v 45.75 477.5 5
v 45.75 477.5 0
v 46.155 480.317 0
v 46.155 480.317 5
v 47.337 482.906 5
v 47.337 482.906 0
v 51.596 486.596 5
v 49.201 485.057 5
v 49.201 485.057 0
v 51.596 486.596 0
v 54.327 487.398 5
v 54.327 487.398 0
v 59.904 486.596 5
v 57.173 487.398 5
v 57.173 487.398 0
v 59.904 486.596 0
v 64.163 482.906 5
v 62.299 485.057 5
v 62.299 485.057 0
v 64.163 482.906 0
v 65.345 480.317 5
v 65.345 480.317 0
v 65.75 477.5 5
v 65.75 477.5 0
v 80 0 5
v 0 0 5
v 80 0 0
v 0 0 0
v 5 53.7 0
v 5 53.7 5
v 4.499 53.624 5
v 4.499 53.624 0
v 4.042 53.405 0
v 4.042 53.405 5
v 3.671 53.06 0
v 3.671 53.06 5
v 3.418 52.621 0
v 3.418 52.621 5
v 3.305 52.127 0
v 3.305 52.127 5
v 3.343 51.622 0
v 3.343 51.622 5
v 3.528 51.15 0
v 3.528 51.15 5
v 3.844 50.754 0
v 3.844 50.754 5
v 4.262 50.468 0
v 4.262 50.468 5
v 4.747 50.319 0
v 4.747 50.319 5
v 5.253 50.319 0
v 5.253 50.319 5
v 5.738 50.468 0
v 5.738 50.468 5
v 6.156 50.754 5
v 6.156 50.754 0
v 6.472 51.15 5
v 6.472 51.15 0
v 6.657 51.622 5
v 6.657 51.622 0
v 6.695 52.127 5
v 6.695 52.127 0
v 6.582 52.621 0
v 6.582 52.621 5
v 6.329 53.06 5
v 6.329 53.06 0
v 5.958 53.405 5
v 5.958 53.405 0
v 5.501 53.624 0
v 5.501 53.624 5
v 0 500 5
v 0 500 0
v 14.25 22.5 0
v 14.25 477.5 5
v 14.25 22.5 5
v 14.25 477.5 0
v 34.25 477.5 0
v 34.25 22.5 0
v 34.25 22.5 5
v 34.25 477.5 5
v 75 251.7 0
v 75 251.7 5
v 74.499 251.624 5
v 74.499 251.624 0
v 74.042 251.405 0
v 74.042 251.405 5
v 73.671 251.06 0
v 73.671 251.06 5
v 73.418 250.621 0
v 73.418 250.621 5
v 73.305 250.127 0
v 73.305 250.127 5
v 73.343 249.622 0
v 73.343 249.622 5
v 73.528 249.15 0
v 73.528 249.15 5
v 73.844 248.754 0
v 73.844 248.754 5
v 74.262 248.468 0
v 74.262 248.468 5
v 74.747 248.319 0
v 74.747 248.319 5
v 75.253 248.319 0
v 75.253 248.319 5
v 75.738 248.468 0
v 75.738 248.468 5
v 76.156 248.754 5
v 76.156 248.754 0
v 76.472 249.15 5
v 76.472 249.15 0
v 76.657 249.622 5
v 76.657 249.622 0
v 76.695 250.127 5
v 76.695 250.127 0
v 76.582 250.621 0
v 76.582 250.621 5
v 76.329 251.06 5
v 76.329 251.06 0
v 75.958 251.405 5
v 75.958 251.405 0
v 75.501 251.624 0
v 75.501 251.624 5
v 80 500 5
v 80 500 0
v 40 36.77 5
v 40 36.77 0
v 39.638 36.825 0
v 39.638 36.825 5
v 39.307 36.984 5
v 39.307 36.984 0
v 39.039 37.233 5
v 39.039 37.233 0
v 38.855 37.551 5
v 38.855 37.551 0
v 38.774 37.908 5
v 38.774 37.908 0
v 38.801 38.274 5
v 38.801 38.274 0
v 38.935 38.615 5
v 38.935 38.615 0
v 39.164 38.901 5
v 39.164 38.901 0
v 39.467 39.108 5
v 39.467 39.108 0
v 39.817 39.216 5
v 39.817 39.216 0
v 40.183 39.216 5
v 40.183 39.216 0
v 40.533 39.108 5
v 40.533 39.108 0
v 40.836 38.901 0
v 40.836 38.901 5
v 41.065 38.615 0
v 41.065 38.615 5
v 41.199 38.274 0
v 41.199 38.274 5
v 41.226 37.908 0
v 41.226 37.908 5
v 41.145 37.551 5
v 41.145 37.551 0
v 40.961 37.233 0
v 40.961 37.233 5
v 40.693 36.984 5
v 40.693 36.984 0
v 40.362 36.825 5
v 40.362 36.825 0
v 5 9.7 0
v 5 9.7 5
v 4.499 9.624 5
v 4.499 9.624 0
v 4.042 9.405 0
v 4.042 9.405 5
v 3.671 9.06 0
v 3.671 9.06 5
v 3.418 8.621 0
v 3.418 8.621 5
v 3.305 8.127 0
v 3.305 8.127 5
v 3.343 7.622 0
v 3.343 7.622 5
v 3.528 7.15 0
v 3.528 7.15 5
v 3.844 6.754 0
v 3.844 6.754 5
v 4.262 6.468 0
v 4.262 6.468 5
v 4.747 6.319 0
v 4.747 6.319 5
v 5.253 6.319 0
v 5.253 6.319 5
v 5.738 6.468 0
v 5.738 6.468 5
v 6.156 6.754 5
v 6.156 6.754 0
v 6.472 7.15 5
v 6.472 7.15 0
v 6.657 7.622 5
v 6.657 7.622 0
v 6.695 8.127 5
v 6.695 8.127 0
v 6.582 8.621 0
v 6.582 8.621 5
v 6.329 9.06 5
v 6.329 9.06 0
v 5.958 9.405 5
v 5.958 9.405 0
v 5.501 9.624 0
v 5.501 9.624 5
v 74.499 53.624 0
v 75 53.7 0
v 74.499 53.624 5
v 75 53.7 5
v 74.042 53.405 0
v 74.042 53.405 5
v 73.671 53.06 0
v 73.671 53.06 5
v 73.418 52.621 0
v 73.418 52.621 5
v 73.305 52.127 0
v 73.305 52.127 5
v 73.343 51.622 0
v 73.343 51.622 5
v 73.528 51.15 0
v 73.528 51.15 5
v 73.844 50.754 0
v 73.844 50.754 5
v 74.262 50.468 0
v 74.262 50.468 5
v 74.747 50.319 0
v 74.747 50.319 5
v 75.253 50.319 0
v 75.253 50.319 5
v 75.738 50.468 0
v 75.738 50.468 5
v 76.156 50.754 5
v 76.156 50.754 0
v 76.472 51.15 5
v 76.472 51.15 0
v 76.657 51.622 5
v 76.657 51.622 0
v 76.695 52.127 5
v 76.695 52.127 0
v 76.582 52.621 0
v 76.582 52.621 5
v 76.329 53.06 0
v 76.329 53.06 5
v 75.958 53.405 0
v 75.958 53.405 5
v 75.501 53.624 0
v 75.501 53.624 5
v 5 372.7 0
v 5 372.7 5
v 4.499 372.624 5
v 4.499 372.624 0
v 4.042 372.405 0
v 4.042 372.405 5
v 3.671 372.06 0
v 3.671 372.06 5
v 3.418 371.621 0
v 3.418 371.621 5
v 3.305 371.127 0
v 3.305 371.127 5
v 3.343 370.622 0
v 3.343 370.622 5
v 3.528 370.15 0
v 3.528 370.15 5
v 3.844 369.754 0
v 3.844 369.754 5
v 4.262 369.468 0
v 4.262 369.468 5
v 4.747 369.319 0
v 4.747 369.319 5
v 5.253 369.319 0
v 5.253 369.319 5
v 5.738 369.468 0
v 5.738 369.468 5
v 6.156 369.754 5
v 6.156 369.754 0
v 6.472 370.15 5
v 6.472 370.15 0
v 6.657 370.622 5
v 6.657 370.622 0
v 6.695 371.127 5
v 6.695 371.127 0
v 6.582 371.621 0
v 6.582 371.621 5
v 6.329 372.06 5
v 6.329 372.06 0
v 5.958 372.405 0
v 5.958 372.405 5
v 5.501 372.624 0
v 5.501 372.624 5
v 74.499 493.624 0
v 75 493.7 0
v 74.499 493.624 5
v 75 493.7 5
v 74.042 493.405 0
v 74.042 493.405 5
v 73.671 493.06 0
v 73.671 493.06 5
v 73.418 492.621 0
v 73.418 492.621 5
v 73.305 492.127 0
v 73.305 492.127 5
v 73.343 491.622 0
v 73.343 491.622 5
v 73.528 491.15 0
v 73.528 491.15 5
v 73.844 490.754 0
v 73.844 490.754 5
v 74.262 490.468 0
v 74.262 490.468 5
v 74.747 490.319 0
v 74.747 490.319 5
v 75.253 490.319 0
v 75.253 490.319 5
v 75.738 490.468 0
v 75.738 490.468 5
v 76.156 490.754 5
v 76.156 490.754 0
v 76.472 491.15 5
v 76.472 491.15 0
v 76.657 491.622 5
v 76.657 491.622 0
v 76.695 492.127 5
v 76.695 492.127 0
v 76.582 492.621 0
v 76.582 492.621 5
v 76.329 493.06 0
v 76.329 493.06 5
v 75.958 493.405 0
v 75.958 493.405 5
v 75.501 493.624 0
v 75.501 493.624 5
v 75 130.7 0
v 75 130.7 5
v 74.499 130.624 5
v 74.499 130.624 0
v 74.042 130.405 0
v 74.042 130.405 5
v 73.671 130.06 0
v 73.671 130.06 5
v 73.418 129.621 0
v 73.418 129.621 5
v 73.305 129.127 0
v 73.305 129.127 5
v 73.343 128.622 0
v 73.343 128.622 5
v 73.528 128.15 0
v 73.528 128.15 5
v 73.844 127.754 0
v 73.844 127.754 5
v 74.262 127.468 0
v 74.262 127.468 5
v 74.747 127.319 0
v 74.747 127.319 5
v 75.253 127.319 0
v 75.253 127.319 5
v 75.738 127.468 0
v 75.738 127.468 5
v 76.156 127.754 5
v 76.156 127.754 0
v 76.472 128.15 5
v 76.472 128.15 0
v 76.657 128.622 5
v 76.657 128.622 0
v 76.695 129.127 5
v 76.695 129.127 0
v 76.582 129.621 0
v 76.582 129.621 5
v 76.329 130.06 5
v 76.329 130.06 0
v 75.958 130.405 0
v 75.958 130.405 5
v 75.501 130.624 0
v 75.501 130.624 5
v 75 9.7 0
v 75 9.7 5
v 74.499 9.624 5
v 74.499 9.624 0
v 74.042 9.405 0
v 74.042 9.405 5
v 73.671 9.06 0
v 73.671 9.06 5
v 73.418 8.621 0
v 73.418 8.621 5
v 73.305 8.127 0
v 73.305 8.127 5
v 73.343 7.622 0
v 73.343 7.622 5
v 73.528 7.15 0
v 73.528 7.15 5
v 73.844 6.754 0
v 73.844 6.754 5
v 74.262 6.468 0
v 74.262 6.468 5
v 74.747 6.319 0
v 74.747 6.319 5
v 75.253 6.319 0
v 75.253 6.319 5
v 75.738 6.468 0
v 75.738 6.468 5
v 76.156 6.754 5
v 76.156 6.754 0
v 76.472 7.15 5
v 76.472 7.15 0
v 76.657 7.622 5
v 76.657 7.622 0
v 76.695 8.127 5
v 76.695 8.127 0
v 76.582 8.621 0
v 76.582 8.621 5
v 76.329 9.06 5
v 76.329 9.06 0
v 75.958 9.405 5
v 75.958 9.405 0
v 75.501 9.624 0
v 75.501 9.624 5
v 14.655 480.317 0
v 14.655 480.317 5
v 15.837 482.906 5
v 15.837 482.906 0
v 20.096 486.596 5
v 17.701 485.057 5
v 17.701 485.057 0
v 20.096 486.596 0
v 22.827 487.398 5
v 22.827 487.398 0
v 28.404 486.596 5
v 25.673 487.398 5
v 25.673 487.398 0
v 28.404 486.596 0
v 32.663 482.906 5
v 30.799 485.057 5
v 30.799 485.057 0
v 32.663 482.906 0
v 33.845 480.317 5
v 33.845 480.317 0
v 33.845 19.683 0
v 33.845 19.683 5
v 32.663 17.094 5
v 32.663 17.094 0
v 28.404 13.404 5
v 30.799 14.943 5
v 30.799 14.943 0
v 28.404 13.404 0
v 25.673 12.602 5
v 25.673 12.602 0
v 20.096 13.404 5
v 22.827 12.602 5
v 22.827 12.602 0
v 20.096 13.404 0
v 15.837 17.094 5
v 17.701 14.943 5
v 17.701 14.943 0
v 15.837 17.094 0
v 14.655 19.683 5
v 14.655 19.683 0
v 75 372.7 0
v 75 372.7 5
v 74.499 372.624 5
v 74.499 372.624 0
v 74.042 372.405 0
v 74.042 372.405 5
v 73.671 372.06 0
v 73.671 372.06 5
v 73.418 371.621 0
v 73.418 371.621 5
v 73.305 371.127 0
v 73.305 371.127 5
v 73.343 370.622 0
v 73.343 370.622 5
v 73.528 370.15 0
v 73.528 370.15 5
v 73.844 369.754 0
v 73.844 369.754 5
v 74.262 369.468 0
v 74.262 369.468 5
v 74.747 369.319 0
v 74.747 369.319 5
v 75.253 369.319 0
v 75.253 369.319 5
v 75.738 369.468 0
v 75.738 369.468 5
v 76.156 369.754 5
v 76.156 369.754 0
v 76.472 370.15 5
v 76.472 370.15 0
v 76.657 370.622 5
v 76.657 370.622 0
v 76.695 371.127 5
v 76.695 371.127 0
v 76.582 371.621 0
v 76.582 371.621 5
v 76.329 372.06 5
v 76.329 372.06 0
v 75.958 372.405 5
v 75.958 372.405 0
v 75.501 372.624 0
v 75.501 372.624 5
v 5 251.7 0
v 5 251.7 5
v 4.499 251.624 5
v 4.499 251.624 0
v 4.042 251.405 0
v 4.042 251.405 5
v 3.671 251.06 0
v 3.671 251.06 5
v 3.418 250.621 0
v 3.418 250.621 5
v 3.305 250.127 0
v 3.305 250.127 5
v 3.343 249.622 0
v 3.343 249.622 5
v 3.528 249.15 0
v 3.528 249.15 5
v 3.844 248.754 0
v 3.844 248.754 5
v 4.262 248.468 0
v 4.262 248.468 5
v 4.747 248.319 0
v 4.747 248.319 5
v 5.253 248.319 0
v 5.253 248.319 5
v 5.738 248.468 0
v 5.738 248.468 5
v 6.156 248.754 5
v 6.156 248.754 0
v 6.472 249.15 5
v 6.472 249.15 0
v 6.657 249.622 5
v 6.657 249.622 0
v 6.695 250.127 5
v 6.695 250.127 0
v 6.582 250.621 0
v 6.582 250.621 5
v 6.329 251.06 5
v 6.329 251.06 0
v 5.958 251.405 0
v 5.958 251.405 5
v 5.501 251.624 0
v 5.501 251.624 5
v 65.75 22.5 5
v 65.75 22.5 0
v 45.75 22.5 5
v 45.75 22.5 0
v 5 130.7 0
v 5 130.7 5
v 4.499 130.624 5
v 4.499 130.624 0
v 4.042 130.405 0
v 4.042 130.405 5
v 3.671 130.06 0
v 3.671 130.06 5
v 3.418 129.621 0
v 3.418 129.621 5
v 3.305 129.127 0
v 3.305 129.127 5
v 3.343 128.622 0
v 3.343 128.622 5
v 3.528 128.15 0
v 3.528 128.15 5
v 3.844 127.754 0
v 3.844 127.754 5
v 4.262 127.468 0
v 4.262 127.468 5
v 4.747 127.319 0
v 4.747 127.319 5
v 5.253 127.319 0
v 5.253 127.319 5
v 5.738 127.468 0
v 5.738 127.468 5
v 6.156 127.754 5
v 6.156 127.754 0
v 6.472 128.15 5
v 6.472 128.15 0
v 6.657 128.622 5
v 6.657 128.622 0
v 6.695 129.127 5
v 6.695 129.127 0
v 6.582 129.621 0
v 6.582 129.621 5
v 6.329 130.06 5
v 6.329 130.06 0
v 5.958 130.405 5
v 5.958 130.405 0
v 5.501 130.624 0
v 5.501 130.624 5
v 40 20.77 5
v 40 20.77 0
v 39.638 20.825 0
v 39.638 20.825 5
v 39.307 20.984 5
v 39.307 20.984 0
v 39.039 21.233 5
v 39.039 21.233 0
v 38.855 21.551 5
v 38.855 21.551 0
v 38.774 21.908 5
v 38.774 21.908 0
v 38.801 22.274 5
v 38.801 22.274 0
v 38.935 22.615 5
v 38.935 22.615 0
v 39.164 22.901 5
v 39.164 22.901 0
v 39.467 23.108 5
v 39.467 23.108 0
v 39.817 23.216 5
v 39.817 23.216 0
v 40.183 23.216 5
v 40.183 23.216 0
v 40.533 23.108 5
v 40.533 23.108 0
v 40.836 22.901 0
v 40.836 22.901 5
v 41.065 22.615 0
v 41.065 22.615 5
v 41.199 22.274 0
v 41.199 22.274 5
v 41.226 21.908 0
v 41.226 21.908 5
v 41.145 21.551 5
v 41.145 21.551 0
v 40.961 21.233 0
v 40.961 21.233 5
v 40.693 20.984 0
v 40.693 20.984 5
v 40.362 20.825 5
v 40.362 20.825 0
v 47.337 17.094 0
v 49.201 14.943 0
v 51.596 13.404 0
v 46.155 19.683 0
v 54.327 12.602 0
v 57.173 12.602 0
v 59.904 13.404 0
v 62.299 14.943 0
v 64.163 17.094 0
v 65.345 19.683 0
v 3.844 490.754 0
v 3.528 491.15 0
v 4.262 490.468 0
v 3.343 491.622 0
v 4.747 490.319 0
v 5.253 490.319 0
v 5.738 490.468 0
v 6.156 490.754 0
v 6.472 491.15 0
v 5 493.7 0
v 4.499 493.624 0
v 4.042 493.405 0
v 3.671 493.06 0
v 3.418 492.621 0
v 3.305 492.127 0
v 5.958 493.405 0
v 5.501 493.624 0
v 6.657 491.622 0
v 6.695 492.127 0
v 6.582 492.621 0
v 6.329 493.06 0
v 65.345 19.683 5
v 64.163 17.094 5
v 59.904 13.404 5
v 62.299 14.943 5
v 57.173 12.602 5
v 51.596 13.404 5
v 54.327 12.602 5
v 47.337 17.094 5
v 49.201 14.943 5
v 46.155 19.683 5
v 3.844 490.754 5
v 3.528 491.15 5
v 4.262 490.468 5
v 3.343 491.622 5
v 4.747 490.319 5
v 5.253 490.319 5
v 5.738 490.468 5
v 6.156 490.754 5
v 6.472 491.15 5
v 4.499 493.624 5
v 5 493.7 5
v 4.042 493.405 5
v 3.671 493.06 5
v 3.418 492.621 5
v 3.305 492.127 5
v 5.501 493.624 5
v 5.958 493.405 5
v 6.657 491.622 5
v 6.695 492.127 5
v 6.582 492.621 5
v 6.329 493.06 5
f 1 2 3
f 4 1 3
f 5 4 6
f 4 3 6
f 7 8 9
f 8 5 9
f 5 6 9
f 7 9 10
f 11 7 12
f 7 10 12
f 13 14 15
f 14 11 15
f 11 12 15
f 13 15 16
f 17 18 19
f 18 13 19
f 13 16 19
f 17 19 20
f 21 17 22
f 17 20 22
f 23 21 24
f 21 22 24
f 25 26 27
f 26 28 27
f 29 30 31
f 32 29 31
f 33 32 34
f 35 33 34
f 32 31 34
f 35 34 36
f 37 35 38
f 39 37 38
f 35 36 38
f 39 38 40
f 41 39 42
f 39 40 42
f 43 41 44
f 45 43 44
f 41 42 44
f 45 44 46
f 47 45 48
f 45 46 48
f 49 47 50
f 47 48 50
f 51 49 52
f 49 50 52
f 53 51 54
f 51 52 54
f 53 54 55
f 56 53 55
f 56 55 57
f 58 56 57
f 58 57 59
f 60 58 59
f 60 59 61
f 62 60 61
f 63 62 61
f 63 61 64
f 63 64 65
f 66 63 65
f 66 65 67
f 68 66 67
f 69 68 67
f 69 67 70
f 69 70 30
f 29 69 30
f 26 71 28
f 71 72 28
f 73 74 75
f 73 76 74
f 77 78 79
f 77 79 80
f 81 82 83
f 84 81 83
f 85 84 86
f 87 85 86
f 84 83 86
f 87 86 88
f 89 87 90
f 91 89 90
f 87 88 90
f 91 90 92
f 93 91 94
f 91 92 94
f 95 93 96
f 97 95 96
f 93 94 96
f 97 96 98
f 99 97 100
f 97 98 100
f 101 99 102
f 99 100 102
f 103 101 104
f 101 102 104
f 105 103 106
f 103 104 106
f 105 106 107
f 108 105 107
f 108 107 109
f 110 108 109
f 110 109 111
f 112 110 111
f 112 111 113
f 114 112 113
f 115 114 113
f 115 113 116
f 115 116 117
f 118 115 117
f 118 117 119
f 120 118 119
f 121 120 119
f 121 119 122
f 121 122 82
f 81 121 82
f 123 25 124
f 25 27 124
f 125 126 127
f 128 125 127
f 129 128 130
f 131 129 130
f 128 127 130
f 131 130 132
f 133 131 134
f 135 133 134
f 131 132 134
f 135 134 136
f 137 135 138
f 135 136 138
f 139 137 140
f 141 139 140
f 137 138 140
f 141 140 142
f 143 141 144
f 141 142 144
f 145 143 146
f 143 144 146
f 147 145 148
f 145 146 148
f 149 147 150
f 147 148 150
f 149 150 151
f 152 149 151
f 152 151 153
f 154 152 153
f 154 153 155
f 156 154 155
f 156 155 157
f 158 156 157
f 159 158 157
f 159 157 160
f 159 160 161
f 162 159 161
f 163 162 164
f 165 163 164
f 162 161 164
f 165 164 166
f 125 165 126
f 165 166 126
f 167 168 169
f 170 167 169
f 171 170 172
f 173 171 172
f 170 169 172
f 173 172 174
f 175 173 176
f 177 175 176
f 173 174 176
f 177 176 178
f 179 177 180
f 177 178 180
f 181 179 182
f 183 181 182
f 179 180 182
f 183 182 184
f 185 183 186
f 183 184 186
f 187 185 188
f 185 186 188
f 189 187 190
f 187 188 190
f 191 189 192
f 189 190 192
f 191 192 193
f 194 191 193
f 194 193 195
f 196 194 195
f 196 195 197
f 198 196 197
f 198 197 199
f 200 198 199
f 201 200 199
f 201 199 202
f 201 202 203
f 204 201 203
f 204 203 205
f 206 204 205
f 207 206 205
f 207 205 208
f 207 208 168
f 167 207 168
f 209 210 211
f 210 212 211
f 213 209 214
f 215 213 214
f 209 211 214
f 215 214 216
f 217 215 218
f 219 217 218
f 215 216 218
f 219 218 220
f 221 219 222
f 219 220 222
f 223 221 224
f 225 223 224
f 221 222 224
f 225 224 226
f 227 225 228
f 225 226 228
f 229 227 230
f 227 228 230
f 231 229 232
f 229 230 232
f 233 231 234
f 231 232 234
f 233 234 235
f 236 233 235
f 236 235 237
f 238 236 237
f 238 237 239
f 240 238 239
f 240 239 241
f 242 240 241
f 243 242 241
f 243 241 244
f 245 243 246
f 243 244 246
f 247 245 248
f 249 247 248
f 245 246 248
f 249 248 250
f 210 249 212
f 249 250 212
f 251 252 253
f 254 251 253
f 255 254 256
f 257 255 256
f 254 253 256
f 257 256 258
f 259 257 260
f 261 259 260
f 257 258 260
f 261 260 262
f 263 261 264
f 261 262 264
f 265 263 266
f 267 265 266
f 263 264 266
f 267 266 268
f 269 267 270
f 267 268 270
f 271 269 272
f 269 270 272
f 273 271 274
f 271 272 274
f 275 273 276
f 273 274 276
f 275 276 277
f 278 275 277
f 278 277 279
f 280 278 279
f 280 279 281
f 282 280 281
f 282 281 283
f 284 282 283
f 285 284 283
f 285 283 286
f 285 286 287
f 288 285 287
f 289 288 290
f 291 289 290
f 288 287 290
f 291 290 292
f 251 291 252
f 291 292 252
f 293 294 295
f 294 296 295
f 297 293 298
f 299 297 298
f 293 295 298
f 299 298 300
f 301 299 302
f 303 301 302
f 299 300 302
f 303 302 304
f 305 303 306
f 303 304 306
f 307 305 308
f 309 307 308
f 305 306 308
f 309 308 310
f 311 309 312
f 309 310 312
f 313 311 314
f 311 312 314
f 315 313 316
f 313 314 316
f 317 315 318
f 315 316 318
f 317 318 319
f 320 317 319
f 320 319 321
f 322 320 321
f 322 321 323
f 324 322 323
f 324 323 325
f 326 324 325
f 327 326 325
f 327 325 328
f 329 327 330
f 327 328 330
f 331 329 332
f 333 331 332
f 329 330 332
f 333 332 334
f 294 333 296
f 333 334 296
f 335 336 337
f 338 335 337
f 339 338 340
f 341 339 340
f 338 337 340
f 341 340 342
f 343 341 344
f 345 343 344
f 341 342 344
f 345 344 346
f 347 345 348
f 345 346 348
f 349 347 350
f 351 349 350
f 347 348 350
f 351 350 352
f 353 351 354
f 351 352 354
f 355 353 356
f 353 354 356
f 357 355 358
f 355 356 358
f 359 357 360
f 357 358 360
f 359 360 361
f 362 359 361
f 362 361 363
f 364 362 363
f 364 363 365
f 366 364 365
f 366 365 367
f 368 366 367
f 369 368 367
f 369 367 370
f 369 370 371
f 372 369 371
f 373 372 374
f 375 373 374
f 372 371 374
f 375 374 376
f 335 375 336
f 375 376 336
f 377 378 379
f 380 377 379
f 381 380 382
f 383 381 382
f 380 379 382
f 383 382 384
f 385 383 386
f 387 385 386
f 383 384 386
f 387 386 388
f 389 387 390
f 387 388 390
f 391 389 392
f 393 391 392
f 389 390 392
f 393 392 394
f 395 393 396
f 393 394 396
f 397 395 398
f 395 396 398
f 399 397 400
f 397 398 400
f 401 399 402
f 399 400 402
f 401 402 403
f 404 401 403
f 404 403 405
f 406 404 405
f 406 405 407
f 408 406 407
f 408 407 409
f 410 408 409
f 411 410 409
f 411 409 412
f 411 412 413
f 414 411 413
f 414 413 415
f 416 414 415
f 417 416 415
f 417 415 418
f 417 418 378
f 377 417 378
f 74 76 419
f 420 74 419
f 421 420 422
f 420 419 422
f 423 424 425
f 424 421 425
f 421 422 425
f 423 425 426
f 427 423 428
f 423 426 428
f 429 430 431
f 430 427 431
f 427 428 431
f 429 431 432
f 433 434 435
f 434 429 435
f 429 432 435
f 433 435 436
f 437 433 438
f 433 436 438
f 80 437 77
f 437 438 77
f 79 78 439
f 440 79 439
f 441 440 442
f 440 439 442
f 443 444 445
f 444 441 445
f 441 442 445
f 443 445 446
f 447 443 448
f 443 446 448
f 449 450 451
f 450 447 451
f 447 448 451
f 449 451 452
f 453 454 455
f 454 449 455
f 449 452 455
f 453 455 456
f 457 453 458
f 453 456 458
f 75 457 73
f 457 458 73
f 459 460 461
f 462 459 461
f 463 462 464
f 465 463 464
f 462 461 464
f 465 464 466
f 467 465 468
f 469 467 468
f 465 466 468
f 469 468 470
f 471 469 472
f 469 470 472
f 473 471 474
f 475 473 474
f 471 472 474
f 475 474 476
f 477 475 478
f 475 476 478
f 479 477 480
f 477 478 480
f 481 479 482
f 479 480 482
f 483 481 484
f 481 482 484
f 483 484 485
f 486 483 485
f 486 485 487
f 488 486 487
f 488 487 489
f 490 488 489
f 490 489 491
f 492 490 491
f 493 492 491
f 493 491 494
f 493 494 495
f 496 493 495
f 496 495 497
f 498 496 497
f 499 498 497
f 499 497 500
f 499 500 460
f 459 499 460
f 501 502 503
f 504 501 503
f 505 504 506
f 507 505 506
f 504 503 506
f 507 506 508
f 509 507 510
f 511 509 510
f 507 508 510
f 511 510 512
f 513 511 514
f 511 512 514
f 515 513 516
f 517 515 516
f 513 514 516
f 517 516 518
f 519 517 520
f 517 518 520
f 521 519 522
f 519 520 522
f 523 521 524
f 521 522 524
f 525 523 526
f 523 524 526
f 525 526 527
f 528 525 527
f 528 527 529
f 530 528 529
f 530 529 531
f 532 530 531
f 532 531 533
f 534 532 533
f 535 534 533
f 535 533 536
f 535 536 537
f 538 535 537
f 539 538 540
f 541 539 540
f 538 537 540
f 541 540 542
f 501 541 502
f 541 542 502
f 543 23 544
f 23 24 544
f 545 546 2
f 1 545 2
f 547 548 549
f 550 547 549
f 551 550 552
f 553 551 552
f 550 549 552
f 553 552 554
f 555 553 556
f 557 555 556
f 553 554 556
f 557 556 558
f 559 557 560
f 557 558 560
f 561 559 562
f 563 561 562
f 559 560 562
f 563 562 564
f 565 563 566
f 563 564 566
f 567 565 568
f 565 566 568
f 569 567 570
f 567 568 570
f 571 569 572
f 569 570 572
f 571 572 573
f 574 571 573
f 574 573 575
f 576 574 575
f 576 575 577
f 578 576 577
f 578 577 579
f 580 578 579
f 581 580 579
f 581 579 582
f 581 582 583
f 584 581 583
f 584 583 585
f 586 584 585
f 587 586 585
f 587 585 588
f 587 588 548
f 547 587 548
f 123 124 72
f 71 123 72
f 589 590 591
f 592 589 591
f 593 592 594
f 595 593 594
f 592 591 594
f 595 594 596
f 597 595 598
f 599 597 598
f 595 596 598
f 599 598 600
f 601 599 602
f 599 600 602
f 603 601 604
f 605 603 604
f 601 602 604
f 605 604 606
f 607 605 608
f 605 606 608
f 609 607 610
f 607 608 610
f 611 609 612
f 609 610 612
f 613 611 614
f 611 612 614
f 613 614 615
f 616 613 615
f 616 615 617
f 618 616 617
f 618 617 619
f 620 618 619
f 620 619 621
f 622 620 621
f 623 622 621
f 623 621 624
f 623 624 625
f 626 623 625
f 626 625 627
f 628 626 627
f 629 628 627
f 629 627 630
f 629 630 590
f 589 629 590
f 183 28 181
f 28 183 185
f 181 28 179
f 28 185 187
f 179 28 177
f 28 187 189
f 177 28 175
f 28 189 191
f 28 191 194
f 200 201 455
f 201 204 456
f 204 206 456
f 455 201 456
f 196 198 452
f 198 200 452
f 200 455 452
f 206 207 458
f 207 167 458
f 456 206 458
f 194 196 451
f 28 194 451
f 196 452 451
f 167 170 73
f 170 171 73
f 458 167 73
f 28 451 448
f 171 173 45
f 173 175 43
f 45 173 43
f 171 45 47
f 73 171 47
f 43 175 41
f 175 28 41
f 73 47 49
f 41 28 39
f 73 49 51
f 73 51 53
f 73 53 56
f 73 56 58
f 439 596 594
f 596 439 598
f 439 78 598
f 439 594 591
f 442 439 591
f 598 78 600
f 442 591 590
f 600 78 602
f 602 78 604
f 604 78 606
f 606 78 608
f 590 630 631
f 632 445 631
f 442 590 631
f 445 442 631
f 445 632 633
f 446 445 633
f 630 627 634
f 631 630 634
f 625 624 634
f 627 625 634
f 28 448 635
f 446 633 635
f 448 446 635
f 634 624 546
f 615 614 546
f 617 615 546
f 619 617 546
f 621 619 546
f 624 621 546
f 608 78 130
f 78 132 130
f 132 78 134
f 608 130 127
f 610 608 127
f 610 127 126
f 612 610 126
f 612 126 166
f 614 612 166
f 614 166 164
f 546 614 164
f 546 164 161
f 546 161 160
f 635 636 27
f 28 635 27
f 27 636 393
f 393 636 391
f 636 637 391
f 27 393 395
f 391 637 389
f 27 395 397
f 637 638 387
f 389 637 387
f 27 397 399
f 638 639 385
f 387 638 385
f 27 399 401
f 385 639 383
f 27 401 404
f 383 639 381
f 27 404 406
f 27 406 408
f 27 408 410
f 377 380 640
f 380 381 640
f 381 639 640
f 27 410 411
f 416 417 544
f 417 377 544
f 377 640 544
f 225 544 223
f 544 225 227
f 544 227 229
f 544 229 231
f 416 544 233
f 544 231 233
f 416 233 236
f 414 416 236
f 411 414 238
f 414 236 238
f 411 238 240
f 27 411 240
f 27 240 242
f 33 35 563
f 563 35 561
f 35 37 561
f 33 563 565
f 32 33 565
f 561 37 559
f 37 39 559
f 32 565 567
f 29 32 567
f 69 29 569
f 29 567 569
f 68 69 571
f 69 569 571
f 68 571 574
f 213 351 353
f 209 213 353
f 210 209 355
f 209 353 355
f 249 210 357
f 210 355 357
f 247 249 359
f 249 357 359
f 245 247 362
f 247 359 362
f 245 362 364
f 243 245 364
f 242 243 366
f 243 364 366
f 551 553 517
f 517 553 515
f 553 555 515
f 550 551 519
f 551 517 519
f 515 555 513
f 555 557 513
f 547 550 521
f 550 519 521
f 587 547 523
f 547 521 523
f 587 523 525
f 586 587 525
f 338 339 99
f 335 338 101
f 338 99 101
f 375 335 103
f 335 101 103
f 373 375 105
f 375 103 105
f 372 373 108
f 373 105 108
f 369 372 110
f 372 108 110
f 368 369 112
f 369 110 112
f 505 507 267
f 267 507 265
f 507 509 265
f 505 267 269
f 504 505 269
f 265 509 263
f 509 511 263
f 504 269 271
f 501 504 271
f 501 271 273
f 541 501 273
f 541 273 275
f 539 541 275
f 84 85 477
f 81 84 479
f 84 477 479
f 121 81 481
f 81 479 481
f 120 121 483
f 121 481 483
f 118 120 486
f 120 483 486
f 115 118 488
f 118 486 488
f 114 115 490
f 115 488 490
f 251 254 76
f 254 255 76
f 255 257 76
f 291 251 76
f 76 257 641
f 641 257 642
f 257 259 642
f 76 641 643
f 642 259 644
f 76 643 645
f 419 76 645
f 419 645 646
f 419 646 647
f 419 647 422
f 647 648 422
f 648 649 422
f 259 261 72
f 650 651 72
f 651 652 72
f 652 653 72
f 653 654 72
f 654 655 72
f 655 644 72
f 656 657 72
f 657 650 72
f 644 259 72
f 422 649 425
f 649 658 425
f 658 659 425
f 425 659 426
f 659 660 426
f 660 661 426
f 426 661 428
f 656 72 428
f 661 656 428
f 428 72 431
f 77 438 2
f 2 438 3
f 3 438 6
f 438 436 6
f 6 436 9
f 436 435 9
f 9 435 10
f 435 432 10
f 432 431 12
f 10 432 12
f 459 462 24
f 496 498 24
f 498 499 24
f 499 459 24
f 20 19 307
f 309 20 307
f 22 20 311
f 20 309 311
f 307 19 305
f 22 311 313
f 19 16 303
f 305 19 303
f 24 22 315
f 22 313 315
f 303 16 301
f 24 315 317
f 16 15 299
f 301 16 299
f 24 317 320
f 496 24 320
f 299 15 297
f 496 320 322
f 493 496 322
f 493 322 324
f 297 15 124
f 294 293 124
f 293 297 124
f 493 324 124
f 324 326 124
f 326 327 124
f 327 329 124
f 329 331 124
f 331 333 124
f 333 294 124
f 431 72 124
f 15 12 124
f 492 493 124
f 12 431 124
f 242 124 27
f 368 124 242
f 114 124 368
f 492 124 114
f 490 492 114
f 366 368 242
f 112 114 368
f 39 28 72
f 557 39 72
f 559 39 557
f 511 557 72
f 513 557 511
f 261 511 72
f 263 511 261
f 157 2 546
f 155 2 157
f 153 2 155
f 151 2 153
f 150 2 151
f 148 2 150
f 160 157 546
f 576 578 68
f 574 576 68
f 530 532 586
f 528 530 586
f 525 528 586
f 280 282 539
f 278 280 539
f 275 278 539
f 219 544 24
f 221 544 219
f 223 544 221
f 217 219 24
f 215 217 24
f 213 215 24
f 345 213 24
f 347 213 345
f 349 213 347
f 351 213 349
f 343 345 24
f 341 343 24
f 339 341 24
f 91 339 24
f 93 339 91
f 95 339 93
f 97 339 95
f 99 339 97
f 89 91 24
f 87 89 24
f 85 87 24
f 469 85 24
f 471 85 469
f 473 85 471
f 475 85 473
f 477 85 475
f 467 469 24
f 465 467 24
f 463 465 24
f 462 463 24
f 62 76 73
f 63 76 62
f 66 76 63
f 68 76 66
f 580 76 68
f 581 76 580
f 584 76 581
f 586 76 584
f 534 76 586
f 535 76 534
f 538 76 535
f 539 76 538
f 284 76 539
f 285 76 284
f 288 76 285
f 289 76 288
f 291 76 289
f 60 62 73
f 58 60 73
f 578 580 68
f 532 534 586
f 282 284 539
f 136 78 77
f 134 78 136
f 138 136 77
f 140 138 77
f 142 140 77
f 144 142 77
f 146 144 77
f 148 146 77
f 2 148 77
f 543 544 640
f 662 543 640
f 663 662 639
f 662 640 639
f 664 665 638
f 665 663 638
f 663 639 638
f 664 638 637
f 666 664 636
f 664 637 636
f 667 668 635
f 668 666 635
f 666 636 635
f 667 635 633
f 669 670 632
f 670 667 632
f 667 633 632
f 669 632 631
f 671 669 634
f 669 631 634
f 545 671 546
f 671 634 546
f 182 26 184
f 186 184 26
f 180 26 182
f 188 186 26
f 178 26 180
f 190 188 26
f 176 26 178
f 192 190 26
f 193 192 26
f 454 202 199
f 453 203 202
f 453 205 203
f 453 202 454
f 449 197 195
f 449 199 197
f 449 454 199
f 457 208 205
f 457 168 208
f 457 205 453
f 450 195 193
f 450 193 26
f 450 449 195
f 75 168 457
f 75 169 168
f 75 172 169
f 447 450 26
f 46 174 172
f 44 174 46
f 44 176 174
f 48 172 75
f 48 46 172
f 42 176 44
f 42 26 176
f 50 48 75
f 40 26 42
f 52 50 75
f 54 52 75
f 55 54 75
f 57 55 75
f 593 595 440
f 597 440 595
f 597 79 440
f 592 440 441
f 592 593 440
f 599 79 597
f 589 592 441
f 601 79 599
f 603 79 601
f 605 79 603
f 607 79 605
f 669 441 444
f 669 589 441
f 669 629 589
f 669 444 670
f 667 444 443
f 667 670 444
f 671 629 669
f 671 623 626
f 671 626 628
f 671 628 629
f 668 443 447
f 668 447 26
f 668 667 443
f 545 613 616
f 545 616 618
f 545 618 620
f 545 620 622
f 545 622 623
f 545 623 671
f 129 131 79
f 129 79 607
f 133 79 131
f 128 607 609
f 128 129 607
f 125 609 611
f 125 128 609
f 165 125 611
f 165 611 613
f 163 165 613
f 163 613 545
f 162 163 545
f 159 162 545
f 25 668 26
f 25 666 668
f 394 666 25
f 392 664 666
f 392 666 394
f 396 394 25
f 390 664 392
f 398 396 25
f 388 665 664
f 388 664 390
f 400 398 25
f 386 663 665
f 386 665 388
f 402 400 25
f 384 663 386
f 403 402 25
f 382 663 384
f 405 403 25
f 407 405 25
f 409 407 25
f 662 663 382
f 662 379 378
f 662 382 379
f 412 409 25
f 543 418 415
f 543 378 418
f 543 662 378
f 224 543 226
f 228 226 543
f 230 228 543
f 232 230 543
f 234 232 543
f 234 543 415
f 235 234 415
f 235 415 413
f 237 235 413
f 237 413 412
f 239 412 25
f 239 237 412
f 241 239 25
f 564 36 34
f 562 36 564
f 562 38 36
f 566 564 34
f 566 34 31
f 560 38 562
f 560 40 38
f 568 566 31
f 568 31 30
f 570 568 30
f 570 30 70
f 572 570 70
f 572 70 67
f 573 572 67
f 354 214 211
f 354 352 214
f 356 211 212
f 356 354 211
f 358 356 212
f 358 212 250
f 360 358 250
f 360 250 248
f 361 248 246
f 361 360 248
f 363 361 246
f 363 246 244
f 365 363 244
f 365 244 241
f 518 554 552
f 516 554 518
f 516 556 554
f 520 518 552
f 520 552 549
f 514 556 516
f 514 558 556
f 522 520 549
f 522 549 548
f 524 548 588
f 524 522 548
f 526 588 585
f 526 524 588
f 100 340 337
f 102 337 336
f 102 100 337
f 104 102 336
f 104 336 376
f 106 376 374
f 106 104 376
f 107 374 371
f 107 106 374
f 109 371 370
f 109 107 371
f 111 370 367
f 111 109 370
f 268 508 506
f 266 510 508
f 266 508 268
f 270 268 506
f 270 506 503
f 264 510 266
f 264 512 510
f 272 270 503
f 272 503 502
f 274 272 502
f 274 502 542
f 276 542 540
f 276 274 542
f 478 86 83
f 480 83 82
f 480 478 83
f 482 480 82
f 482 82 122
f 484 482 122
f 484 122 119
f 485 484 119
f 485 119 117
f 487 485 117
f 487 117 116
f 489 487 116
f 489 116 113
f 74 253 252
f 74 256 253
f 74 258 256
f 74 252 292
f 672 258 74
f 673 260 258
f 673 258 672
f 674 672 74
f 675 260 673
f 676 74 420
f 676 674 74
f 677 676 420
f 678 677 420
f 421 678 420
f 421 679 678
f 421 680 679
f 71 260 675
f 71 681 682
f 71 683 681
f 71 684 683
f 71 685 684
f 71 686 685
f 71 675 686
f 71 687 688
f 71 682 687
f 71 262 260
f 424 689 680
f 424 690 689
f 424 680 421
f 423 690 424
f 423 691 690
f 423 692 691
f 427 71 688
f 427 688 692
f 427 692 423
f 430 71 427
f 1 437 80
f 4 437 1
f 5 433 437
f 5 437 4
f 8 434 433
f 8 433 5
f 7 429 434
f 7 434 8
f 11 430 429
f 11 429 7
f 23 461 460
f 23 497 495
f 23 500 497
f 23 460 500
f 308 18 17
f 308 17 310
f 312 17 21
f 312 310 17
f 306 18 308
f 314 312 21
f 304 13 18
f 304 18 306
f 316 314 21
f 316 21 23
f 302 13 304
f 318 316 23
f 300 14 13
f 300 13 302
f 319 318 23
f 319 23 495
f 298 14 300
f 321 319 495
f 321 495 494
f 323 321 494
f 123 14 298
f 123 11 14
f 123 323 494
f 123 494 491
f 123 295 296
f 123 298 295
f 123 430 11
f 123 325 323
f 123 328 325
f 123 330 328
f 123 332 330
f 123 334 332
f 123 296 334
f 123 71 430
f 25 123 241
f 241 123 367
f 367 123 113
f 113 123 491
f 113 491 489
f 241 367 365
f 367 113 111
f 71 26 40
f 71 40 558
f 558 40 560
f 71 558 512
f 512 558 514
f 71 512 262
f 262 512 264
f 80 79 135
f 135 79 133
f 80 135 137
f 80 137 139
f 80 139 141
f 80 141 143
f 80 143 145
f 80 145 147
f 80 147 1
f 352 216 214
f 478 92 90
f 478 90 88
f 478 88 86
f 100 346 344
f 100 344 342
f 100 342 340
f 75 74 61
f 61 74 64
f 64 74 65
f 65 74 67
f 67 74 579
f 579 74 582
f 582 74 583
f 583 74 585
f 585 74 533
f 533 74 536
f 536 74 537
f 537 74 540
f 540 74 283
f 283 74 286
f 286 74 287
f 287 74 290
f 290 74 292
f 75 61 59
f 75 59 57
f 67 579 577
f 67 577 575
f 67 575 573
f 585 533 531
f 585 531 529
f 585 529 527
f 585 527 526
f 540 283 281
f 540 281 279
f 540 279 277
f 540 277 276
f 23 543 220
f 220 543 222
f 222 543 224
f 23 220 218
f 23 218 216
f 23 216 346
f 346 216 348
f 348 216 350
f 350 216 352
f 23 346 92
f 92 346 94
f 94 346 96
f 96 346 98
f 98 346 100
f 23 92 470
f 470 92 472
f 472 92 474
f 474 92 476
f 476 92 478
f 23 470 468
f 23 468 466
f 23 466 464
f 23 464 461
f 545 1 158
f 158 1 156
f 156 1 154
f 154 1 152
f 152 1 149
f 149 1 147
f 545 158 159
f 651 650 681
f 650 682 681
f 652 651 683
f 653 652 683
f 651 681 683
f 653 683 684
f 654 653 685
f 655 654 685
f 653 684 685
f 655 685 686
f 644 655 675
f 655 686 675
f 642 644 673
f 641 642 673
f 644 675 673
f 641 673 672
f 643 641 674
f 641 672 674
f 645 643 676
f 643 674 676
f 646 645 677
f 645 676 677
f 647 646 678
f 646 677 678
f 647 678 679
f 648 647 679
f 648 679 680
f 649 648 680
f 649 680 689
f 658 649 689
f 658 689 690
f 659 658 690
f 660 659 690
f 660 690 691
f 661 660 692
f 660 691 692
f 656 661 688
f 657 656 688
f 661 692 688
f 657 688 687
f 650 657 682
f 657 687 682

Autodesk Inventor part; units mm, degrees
ref_plane "YZ Plane" through (0, 0, 0) normal (1, 0, 0) x (0, 1, 0)
ref_plane "XZ Plane" through (0, 0, 0) normal (0, 1, 0) x (-1, 0, 0)
ref_plane "XY Plane" through (0, 0, 0) normal (0, 0, 1) x (1, 0, 0)
sketch "Sketch1" plane through (0, 0, 0) normal (0, 0, 1) x (1, 0, 0)
  line L0 (0, 0) -> (80, 0)
  line L1 (80, 0) -> (80, 500)
  line L2 (80, 500) -> (0, 500)
  line L3 (0, 500) -> (0, 0)
  line L4 (40, 500) -> (40, 0) construction
  line L5 (24.25, 477.5) -> (24.25, 22.5) construction
  line L6 (14.25, 477.5) -> (14.25, 22.5)
  line L7 (34.25, 22.5) -> (34.25, 477.5)
  arc A0 (34.25, 477.5) -> (14.25, 477.5) centre (24.25, 477.5) ccw
  arc A1 (14.25, 22.5) -> (34.25, 22.5) centre (24.25, 22.5) ccw
  circle A2 centre (5, 52) radius 2.5 construction
  circle A3 centre (5, 8) radius 2.5 construction
  line L8 (65.75, 477.5) -> (65.75, 22.5)
  line L9 (45.75, 22.5) -> (45.75, 477.5)
  arc A4 (65.75, 477.5) -> (45.75, 477.5) centre (55.75, 477.5) ccw
  arc A5 (45.75, 22.5) -> (65.75, 22.5) centre (55.75, 22.5) ccw
  circle A6 centre (75, 52) radius 2.5 construction
  circle A7 centre (75, 8) radius 2.5 construction
  circle A8 centre (5, 492) radius 1 construction
  circle A9 centre (75, 492) radius 1 construction
  line L10 (5, 8) -> (5, 52) construction
  circle A10 centre (5, 371) radius 1 construction
  circle A11 centre (75, 371) radius 1 construction
  circle A12 centre (5, 250) radius 1 construction
  circle A13 centre (75, 250) radius 1 construction
  circle A14 centre (5, 129) radius 1 construction
  circle A15 centre (75, 129) radius 1 construction
  circle A16 centre (5, 8) radius 1 construction
  circle A17 centre (75, 8) radius 1 construction
  line L11 (75, 8) -> (75, 52) construction
  line L12 (0, 500) -> (10, 500) construction
  line L13 (10, 500) -> (10, 0) construction
  line L14 (10, 0) -> (0, 0) construction
  line L15 (0, 0) -> (0, 500) construction
  line L16 (80, 500) -> (70, 500) construction
  line L17 (70, 500) -> (70, 0) construction
  line L18 (70, 0) -> (80, 0) construction
  line L19 (80, 0) -> (80, 500) construction
  line L20 (5, 8) -> (75, 8) construction
  line L21 (5, 8) -> (75, 8) construction
  point P0 (24.25, 250)
  dimension "d0" = 500
  dimension "d1" = 80
  dimension "d2" = 10
  dimension "d6" = 5
  dimension "d7" = 5
  dimension "d10" = 44
  dimension "d12" = 31.5
  dimension "d17" = 2
  dimension "d18" = 5
  dimension "d19" = 8
  dimension "d27" = 455
  dimension "d28" = 250
  dimension "d32" = 121
  dimension "d45" = 10
  dimension "d46" = 10
  dimension "d54" = 70
extrude "Extrusion1" add sketch "Sketch1" along normal blind 5
hole "Bohrung1" at (5, 52, 0) at (5, 8, 0) at (75, 8, 0) at (75, 52, 0) direction (0, 0, 1) diameter 3.4 depth 11.8 tip angle 118 clearance for "Inbusschraube DIN EN ISO 4762" size "M3" standard "DIN"
hole "Bohrung2" at (5, 492, 0) at (75, 492, 0) at (5, 371, 0) at (75, 371, 0) at (5, 250, 0) at (75, 250, 0) at (5, 129, 0) at (75, 129, 0) at (5, 8, 0) at (75, 8, 0) direction (0, 0, 1) diameter 3.4 end through all clearance for "Inbusschraube DIN EN ISO 4762" size "M3" standard "DIN"
ref_plane "Arbeitsebene2" through (5, 30, 5.9) normal (0, 1, 0) x (0, 0, 1)
ref_plane "Arbeitsebene1" through (5, 8, 5.9) normal (0, 1, 0) x (0, 0, 1)
sketch "Skizze2" plane through (0, 0, 5) normal (0, 0, 1) x (1, 0, 0)
  line L0 (-16, 30) -> (96, 30) construction
  line L1 (40, 500) -> (40, 0) construction
  point P0 (0, 0)
  point P1 (40, 38)
  point P2 (40, 22)
  dimension "d56" = 8
  dimension "d57" = 8
hole "Bohrung3" at (40, 22, 5) at (40, 38, 5) direction (0, 0, -1) diameter 2.459 depth 8.8 tip angle 118 thread size "M3x0.5" class "6H" standard "ISO Metric profile"
equation "\"d0\" = GuidanceTrack_Length"
equation "\"d1\" = BackPlate_Width"
equation "\"d18\" = 0.5 * GuidanceTrac_OneSide_Thickness"
equation "\"d19\" = TopLit_Fixhole_Edge_Dist"
equation "\"d28\" = 0.5 * d0"
equation "\"d54\" = Guidacne_fixHoleDist"
equation "\"d57\" = d56"
equation "\"GuidanceTrack_Length\" = 500"
equation "\"BackPlate_Width\" = 80"
equation "\"GuidanceTrac_OneSide_Thickness\" = 10"
equation "\"TopLit_Fixhole_Edge_Dist\" = 8"
equation "\"Guidacne_fixHoleDist\" = 70"
properties part number "Slot profile" material "PMMA-Kunststoff"
